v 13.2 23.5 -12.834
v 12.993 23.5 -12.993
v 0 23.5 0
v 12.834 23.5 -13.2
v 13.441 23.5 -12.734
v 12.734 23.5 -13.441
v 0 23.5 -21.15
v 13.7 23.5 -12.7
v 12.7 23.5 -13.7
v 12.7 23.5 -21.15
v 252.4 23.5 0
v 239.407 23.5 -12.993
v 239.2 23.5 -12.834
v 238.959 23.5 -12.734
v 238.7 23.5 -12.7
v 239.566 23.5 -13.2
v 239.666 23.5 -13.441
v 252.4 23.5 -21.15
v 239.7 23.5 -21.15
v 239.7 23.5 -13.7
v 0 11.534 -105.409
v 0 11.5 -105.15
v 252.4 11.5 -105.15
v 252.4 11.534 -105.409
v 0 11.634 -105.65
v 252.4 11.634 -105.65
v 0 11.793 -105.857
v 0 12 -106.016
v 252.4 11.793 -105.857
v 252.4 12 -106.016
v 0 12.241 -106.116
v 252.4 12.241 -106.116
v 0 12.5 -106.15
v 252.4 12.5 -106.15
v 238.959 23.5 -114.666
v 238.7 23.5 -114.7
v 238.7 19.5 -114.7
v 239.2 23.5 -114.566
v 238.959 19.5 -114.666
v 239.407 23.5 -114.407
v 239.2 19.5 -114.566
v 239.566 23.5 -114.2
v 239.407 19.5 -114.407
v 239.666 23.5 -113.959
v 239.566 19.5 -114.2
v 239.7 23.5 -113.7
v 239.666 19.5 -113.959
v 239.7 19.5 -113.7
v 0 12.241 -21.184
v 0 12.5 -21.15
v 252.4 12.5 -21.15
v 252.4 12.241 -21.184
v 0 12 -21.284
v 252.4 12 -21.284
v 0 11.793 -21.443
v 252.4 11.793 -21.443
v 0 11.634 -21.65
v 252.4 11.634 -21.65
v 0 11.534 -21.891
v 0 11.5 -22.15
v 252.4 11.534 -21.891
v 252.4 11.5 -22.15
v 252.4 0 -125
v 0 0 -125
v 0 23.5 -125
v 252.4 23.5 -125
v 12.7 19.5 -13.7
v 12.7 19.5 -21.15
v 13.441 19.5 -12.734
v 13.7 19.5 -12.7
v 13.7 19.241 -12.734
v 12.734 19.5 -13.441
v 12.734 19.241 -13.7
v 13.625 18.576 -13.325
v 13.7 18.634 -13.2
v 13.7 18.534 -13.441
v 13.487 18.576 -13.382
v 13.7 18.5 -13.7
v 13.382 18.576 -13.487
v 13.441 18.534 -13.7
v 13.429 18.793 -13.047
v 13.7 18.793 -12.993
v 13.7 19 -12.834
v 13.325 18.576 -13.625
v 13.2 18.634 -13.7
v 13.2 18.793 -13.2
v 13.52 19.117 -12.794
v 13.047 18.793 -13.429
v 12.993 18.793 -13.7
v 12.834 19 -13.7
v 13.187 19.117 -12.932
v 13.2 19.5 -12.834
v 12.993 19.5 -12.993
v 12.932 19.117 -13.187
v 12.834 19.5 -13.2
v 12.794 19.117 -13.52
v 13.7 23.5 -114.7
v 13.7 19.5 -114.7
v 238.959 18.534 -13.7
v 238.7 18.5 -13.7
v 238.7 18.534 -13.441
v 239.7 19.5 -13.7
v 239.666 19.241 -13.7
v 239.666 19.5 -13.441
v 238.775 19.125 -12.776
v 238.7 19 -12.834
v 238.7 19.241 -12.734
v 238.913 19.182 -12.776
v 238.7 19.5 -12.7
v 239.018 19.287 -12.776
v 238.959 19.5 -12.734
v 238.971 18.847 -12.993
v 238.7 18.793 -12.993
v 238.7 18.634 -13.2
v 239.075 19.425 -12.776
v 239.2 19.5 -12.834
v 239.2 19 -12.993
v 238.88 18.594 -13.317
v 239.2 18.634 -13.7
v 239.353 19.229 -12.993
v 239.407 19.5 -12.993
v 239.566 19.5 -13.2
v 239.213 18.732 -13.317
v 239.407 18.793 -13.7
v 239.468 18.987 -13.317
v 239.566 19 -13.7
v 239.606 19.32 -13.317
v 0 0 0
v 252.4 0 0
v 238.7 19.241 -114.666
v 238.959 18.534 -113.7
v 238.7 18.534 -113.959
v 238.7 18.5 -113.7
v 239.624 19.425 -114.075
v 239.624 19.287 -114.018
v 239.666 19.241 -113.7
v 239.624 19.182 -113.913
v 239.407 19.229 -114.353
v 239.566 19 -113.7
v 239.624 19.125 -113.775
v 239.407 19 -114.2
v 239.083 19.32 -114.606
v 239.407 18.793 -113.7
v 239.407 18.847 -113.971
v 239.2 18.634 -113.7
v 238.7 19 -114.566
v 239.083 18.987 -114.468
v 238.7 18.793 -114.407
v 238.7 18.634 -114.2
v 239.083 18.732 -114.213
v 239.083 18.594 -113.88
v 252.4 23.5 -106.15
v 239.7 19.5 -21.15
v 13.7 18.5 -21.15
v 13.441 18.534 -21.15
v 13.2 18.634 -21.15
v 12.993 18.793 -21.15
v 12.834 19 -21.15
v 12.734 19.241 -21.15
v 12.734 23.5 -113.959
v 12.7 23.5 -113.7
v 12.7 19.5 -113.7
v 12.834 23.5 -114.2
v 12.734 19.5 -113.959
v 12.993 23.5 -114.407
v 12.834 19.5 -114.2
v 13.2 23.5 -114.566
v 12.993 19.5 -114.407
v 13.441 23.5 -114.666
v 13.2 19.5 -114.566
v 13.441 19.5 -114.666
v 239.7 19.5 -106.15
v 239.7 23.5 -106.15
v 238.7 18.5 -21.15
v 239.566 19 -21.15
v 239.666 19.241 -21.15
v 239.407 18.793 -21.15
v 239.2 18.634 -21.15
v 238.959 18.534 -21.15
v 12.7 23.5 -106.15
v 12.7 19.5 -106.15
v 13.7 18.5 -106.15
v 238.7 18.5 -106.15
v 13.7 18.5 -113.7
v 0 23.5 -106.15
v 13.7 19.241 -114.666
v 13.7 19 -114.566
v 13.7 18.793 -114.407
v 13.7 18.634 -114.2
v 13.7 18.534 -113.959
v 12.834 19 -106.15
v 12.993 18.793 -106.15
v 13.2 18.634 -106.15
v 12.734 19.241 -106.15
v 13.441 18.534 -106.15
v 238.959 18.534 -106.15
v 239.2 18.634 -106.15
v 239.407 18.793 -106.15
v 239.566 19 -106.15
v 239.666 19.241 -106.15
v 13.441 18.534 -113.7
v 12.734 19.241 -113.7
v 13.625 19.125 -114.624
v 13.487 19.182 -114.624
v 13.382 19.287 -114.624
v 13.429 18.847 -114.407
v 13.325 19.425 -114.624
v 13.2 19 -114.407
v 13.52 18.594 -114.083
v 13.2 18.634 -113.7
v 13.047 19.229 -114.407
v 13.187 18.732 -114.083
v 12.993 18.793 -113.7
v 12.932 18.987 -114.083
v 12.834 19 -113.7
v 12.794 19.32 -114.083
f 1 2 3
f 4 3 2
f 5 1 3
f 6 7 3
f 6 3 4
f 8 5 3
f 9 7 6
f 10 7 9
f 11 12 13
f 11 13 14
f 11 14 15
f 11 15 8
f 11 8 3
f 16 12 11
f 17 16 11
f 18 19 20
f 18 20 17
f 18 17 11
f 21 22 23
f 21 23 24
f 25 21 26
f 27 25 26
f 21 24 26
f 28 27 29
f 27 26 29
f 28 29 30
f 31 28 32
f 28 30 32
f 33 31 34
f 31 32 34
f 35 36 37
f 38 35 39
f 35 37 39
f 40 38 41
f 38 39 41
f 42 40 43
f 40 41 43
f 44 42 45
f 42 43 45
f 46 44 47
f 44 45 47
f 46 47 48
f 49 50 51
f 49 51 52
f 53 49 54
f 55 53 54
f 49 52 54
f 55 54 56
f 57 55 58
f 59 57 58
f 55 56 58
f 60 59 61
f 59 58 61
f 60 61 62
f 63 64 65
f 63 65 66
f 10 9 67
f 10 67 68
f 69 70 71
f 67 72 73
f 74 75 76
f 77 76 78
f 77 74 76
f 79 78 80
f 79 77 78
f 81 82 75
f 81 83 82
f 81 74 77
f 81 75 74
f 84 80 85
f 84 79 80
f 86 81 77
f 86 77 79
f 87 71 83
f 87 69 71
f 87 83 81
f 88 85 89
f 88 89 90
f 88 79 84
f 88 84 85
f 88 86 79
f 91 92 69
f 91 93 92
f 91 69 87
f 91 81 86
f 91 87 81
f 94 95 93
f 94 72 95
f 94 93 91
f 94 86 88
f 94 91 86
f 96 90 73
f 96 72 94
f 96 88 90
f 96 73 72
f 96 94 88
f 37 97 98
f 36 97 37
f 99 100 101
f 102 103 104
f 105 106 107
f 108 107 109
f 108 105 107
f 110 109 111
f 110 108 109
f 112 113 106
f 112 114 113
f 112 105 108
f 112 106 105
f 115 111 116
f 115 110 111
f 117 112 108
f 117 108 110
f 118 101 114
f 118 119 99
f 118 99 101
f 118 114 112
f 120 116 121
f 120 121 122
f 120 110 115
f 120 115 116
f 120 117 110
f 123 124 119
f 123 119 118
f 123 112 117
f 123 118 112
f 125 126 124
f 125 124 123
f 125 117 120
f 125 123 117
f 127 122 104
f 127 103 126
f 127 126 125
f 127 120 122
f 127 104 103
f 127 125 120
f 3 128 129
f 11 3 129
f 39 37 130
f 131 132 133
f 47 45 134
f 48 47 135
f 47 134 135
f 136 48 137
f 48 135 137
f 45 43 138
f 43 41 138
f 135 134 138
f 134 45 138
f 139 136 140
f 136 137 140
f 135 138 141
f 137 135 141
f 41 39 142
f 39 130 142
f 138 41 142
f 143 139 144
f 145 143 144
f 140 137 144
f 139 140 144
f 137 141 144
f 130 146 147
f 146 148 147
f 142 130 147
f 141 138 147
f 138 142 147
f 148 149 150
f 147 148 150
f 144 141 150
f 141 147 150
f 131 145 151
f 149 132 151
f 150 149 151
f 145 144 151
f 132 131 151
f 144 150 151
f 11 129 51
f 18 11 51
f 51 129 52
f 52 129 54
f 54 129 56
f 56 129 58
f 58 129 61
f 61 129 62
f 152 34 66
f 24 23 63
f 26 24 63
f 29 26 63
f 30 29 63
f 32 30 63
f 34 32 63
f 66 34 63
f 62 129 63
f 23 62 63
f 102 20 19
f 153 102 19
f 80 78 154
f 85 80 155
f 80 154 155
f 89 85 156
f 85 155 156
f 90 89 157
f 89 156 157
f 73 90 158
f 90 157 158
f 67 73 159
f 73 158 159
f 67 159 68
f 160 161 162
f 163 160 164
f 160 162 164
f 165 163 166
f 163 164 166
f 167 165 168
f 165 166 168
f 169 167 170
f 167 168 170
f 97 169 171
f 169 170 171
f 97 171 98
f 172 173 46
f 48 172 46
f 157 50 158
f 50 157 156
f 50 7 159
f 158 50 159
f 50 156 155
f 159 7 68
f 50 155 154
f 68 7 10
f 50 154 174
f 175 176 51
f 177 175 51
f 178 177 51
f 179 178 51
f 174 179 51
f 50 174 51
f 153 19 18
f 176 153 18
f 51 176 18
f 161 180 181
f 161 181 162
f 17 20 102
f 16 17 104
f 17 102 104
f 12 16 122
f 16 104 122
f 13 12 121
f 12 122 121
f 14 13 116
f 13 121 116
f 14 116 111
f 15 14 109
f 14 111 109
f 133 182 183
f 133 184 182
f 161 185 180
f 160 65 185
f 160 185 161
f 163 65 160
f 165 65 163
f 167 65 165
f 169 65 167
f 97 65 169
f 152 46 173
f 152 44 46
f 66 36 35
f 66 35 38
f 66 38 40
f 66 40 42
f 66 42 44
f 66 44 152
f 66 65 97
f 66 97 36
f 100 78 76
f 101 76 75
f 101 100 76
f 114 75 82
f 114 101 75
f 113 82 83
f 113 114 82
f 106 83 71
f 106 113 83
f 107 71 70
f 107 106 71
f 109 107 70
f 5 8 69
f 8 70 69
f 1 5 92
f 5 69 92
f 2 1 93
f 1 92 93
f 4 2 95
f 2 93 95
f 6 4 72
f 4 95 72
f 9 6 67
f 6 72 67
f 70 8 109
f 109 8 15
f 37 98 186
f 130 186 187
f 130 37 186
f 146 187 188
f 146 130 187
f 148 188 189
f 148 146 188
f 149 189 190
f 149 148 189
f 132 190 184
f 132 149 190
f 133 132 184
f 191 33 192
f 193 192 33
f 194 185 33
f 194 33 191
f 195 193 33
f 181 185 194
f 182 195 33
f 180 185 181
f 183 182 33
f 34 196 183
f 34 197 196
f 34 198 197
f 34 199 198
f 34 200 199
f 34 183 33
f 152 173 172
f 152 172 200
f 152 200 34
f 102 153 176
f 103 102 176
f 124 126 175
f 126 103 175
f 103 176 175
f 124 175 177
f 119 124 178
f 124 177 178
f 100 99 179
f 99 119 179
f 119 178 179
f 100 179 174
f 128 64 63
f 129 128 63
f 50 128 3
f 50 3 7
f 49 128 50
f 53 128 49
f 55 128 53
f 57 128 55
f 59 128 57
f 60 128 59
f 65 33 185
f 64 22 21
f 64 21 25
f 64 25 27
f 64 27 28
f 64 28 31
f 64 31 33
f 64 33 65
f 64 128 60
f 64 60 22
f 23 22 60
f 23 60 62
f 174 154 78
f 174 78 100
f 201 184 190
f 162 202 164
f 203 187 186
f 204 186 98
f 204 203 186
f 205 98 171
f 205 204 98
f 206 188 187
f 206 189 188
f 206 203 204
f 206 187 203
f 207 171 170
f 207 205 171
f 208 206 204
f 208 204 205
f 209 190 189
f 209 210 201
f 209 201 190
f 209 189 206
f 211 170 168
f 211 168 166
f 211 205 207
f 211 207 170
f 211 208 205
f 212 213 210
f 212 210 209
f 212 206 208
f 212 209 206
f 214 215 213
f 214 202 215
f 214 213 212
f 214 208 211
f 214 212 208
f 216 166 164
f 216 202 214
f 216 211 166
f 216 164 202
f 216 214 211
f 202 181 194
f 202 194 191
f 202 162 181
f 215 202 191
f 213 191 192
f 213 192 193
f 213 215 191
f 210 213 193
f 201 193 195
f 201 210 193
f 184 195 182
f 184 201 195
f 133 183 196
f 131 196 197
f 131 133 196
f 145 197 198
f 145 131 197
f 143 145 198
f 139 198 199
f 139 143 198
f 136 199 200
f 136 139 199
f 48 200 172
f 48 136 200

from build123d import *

# Parameters (mm, degrees)
SKETCH1_W           = 252.4
SKETCH1_H           = 125
BOSS_EXTRUDE1_DEPTH = 23.5
SKETCH2_W           = 227
SKETCH2_H           = 102
CUT_EXTRUDE1_DEPTH  = 5
SKETCH3_W           = 227
SKETCH3_H           = 85
CUT_EXTRUDE2_DEPTH  = 7
SKETCH4_W           = 12.7
SKETCH4_H           = 85
CUT_EXTRUDE3_DEPTH  = 12
SKETCH5_W           = 12.7
SKETCH5_H           = 85
CUT_EXTRUDE4_DEPTH  = 12
FILLET1_R           = 1


with BuildPart() as part:
    # Sketch1 → Boss-Extrude1 (new body)
    with BuildSketch(Plane(origin=(0, 0, 0), x_dir=(1, 0, 0), z_dir=(0, 1, 0))):
        with Locations((126.2, 62.5)):
            Rectangle(SKETCH1_W, SKETCH1_H)
    extrude(amount=BOSS_EXTRUDE1_DEPTH)

    # Sketch2 → Cut-Extrude1 (cut)
    with BuildSketch(Plane(origin=(0, 23.5, 0), x_dir=(1, 0, 0), z_dir=(0, 1, 0))):
        with Locations((126.2, 63.7)):
            Rectangle(SKETCH2_W, SKETCH2_H)
    extrude(amount=-CUT_EXTRUDE1_DEPTH, mode=Mode.SUBTRACT)

    # Sketch3 → Cut-Extrude2 (cut)
    with BuildSketch(Plane(origin=(0, 18.5, 0), x_dir=(1, 0, 0), z_dir=(0, 1, 0))):
        with Locations((126.2, 63.65)):
            Rectangle(SKETCH3_W, SKETCH3_H)
    extrude(amount=-CUT_EXTRUDE2_DEPTH, mode=Mode.SUBTRACT)

    # Sketch4 → Cut-Extrude3 (cut)
    with BuildSketch(Plane(origin=(0, 23.5, 0), x_dir=(1, 0, 0), z_dir=(0, 1, 0))):
        with Locations((6.35, 63.65)):
            Rectangle(SKETCH4_W, SKETCH4_H)
    extrude(amount=-CUT_EXTRUDE3_DEPTH, mode=Mode.SUBTRACT)

    # Sketch5 → Cut-Extrude4 (cut)
    with BuildSketch(Plane(origin=(0, 23.5, 0), x_dir=(1, 0, 0), z_dir=(0, 1, 0))):
        with Locations((246.05, 63.65)):
            Rectangle(SKETCH5_W, SKETCH5_H)
    extrude(amount=-CUT_EXTRUDE4_DEPTH, mode=Mode.SUBTRACT)

    # Fillet1
    fillet1_edges = [part.edges().sort_by_distance(p)[0] for p in [
        (12.7, 18.5, -110.425),
        (12.7, 21, -12.7),
        (126.2, 18.5, -114.7),
        (12.7, 21, -114.7),
        (239.7, 18.5, -16.925),
        (239.7, 21, -114.7),
        (126.2, 18.5, -12.7),
        (239.7, 21, -12.7),
        (12.7, 18.5, -16.925),
        (239.7, 18.5, -110.425),
        (126.2, 11.5, -21.15),
        (126.2, 11.5, -106.15),
    ]]
    fillet(fillet1_edges, radius=FILLET1_R)


solid = part.part
